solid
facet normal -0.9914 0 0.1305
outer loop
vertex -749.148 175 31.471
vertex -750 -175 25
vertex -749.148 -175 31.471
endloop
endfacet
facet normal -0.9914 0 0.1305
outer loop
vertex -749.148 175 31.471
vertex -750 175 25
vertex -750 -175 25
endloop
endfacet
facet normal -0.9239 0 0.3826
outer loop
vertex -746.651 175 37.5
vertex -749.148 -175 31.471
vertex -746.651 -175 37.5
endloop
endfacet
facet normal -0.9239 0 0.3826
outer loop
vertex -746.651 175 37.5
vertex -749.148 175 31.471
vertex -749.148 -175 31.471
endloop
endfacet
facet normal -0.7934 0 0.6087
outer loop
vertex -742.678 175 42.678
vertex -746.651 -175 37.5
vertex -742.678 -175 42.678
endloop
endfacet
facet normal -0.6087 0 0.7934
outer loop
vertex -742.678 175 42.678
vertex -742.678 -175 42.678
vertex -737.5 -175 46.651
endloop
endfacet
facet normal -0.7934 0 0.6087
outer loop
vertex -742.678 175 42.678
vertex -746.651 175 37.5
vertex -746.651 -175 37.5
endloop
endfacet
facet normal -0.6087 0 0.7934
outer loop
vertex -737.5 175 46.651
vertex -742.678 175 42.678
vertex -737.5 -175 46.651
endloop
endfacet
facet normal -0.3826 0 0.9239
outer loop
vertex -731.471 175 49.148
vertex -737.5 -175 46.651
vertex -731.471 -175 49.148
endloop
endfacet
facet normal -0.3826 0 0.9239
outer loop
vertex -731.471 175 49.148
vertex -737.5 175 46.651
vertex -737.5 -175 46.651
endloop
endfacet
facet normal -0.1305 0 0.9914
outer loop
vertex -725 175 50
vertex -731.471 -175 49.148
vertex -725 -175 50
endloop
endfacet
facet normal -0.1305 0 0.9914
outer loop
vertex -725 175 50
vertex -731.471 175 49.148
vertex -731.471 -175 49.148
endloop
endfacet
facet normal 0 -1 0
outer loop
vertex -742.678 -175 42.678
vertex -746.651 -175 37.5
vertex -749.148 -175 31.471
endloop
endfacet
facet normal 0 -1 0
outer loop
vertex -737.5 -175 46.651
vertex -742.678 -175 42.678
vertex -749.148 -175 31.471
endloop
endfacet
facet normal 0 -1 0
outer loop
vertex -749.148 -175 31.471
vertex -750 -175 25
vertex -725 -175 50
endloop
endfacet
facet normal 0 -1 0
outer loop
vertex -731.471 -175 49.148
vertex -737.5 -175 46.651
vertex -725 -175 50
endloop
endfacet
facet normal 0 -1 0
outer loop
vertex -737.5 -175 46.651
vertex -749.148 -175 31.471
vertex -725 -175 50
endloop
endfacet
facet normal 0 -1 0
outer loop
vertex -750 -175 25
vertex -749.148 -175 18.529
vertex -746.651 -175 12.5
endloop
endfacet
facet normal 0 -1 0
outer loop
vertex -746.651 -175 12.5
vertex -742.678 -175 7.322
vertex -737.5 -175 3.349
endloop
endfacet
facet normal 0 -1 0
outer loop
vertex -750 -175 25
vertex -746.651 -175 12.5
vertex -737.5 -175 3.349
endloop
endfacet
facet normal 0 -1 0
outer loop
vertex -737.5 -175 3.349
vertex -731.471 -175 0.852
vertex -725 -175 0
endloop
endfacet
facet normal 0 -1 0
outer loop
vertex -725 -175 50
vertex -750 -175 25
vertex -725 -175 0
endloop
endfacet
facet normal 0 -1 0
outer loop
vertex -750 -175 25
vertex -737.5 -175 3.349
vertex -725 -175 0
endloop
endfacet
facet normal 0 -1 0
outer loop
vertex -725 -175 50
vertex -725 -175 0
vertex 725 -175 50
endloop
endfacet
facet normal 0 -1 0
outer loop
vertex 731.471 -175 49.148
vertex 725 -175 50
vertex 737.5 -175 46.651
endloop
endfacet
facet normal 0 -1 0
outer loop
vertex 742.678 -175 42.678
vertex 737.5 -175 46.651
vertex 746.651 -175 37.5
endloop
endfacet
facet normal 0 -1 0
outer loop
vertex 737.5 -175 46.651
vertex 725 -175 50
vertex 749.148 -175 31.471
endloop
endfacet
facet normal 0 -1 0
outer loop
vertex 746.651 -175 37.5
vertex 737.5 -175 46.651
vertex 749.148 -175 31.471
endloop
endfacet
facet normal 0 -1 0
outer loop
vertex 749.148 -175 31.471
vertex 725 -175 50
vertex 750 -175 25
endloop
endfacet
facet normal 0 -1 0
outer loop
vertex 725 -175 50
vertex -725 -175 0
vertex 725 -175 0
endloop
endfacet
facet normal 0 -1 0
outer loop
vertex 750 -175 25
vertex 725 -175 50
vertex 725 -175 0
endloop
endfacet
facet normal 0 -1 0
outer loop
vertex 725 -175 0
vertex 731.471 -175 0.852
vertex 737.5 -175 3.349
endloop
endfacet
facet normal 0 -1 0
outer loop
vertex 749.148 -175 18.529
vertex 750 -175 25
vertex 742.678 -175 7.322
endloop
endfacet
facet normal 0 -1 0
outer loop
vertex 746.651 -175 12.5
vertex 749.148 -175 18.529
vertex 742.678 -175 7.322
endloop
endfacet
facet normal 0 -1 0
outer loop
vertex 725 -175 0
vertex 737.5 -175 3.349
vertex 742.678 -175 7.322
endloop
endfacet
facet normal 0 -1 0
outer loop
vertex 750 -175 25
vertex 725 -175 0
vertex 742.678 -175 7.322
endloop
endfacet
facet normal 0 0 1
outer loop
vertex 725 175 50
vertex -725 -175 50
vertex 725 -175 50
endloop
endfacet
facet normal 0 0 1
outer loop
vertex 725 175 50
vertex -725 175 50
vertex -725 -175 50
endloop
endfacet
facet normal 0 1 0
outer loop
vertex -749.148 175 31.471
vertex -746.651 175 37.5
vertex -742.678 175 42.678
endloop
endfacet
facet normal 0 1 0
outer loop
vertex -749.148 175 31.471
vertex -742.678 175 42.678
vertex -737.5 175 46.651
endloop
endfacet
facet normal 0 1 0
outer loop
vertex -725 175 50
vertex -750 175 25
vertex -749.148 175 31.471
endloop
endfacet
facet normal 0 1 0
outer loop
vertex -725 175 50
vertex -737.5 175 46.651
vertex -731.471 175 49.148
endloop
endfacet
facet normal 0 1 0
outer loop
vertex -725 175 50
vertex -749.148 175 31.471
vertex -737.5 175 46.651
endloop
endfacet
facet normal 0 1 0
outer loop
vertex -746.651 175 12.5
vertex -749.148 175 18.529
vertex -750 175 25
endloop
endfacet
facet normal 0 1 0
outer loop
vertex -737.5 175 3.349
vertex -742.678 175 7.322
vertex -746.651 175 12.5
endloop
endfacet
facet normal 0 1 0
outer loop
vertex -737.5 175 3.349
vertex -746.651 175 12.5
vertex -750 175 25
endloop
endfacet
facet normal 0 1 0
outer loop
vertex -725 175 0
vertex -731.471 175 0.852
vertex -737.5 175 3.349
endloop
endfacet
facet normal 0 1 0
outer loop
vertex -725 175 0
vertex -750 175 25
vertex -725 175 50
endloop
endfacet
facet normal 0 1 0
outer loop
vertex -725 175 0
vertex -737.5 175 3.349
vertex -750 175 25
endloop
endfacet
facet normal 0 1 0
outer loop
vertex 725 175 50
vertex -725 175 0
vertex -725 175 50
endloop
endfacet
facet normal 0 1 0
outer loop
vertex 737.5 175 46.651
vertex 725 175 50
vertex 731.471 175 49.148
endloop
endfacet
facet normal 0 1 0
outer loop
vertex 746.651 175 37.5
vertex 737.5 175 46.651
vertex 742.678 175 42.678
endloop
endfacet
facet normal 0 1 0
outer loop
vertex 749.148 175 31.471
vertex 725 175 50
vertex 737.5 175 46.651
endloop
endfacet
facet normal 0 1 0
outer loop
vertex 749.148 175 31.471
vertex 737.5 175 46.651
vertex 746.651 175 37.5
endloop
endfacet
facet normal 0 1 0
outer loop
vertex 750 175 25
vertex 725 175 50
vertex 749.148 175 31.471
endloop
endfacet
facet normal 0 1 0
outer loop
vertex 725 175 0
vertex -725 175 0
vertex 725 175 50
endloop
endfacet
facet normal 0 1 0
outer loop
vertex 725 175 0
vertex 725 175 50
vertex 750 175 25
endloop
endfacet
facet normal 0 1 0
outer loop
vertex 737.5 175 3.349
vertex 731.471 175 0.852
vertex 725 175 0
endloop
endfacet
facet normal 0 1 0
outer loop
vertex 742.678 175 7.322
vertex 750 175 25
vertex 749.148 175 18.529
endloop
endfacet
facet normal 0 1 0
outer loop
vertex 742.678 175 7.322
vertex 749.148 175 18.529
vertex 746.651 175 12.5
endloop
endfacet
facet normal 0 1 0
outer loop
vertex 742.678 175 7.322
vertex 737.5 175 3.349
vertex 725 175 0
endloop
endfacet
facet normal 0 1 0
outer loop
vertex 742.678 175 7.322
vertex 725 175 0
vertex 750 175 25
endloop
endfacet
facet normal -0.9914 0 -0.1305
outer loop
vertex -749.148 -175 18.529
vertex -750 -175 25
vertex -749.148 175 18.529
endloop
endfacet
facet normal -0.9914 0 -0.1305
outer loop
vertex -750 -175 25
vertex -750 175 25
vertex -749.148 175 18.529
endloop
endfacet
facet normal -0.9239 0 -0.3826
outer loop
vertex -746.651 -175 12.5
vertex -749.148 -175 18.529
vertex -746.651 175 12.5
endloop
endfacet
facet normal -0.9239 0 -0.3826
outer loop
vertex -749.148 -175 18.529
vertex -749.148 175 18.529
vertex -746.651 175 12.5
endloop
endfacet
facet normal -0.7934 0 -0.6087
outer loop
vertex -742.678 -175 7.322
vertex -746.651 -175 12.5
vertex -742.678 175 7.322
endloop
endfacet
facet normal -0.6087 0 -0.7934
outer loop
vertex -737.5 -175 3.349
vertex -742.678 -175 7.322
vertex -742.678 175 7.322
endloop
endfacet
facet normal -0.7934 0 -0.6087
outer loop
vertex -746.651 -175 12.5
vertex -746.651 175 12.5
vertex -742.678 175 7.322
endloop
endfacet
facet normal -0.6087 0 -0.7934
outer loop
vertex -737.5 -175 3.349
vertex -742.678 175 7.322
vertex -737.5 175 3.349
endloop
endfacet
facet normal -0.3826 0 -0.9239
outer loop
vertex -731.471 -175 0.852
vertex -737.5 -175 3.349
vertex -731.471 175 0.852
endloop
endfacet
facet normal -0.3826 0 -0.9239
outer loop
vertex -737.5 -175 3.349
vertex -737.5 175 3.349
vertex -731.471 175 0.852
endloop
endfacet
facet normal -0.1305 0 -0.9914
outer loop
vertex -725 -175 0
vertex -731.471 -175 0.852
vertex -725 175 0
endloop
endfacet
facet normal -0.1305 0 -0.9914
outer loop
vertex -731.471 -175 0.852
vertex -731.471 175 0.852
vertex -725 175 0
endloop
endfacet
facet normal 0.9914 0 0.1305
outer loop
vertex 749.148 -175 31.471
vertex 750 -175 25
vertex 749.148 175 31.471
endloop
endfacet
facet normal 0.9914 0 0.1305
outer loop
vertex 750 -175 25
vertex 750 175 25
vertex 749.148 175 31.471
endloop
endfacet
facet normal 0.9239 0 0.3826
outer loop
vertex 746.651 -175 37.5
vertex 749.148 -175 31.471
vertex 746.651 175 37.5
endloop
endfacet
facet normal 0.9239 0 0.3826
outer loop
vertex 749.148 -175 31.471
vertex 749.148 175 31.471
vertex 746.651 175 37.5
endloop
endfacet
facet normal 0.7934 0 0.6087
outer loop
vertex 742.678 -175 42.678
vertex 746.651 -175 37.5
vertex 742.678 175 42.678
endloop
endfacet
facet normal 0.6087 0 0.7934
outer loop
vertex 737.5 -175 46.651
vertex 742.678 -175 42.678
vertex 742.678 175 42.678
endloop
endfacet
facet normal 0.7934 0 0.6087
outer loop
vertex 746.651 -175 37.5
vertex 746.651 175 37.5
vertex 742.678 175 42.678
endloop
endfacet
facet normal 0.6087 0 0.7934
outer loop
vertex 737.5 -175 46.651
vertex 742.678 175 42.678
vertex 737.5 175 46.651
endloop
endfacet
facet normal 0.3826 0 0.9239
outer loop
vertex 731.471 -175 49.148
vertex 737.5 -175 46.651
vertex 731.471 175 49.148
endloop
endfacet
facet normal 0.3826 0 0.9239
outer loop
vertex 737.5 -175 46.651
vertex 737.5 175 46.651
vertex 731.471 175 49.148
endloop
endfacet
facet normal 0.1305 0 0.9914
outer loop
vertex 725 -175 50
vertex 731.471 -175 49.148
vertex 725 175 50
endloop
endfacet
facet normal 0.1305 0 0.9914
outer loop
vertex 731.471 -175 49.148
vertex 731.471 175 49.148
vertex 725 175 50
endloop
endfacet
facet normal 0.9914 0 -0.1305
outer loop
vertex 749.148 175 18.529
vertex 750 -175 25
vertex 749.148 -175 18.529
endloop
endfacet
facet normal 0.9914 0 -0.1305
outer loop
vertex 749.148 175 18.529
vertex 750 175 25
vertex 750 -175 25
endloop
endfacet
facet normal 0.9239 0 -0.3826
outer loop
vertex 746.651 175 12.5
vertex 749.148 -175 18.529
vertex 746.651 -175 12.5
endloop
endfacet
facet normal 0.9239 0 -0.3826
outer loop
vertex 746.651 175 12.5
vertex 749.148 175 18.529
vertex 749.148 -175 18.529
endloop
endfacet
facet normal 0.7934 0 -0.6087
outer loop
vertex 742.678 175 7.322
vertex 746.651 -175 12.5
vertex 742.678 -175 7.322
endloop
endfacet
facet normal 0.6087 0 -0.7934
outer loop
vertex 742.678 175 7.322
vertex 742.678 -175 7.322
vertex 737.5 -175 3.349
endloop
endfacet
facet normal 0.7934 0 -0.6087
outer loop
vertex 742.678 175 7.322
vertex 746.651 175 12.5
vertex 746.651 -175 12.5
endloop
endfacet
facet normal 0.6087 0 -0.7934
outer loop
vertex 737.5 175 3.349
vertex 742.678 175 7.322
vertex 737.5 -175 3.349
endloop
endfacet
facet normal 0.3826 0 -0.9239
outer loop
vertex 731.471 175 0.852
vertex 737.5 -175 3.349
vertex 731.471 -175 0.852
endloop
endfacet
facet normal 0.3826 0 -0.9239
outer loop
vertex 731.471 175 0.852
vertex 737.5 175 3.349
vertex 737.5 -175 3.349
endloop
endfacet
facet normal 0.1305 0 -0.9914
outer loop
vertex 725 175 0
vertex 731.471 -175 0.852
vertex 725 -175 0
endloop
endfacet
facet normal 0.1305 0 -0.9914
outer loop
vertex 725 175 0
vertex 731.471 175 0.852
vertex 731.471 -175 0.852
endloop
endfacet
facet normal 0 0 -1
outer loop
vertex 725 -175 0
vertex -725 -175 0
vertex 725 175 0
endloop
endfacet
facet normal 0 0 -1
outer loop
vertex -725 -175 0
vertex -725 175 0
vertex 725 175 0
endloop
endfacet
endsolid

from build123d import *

# Parameters (mm, degrees)
SKETCH1_W             = 1500
SKETCH1_H             = 350
BOSS_EXTRUDE1_DEPTH   = 50
FILLET1_R             = 25
BODY_MOVE_COPY1_ANGLE = 90


with BuildPart() as part:
    # Sketch1 → Boss-Extrude1 (new body)
    with BuildSketch(Plane(origin=(0, 0, 0), x_dir=(1, 0, 0), z_dir=(0, 1, 0))):
        Rectangle(SKETCH1_W, SKETCH1_H)
    extrude(amount=BOSS_EXTRUDE1_DEPTH)

    # Fillet1
    fillet1_edges = [part.edges().sort_by_distance(p)[0] for p in [
        (750, 0, 0),
        (750, 50, 0),
        (-750, 0, 0),
        (-750, 50, 0),
    ]]
    fillet(fillet1_edges, radius=FILLET1_R - 0.0001)  # a hair under: the kernel refuses the full size


with BuildPart() as part_1:
    # Body-Move/Copy1: moved
    add(part.part.rotate(Axis((0, 0, 0), (1, 0, 0)), BODY_MOVE_COPY1_ANGLE))


solid = part_1.part
